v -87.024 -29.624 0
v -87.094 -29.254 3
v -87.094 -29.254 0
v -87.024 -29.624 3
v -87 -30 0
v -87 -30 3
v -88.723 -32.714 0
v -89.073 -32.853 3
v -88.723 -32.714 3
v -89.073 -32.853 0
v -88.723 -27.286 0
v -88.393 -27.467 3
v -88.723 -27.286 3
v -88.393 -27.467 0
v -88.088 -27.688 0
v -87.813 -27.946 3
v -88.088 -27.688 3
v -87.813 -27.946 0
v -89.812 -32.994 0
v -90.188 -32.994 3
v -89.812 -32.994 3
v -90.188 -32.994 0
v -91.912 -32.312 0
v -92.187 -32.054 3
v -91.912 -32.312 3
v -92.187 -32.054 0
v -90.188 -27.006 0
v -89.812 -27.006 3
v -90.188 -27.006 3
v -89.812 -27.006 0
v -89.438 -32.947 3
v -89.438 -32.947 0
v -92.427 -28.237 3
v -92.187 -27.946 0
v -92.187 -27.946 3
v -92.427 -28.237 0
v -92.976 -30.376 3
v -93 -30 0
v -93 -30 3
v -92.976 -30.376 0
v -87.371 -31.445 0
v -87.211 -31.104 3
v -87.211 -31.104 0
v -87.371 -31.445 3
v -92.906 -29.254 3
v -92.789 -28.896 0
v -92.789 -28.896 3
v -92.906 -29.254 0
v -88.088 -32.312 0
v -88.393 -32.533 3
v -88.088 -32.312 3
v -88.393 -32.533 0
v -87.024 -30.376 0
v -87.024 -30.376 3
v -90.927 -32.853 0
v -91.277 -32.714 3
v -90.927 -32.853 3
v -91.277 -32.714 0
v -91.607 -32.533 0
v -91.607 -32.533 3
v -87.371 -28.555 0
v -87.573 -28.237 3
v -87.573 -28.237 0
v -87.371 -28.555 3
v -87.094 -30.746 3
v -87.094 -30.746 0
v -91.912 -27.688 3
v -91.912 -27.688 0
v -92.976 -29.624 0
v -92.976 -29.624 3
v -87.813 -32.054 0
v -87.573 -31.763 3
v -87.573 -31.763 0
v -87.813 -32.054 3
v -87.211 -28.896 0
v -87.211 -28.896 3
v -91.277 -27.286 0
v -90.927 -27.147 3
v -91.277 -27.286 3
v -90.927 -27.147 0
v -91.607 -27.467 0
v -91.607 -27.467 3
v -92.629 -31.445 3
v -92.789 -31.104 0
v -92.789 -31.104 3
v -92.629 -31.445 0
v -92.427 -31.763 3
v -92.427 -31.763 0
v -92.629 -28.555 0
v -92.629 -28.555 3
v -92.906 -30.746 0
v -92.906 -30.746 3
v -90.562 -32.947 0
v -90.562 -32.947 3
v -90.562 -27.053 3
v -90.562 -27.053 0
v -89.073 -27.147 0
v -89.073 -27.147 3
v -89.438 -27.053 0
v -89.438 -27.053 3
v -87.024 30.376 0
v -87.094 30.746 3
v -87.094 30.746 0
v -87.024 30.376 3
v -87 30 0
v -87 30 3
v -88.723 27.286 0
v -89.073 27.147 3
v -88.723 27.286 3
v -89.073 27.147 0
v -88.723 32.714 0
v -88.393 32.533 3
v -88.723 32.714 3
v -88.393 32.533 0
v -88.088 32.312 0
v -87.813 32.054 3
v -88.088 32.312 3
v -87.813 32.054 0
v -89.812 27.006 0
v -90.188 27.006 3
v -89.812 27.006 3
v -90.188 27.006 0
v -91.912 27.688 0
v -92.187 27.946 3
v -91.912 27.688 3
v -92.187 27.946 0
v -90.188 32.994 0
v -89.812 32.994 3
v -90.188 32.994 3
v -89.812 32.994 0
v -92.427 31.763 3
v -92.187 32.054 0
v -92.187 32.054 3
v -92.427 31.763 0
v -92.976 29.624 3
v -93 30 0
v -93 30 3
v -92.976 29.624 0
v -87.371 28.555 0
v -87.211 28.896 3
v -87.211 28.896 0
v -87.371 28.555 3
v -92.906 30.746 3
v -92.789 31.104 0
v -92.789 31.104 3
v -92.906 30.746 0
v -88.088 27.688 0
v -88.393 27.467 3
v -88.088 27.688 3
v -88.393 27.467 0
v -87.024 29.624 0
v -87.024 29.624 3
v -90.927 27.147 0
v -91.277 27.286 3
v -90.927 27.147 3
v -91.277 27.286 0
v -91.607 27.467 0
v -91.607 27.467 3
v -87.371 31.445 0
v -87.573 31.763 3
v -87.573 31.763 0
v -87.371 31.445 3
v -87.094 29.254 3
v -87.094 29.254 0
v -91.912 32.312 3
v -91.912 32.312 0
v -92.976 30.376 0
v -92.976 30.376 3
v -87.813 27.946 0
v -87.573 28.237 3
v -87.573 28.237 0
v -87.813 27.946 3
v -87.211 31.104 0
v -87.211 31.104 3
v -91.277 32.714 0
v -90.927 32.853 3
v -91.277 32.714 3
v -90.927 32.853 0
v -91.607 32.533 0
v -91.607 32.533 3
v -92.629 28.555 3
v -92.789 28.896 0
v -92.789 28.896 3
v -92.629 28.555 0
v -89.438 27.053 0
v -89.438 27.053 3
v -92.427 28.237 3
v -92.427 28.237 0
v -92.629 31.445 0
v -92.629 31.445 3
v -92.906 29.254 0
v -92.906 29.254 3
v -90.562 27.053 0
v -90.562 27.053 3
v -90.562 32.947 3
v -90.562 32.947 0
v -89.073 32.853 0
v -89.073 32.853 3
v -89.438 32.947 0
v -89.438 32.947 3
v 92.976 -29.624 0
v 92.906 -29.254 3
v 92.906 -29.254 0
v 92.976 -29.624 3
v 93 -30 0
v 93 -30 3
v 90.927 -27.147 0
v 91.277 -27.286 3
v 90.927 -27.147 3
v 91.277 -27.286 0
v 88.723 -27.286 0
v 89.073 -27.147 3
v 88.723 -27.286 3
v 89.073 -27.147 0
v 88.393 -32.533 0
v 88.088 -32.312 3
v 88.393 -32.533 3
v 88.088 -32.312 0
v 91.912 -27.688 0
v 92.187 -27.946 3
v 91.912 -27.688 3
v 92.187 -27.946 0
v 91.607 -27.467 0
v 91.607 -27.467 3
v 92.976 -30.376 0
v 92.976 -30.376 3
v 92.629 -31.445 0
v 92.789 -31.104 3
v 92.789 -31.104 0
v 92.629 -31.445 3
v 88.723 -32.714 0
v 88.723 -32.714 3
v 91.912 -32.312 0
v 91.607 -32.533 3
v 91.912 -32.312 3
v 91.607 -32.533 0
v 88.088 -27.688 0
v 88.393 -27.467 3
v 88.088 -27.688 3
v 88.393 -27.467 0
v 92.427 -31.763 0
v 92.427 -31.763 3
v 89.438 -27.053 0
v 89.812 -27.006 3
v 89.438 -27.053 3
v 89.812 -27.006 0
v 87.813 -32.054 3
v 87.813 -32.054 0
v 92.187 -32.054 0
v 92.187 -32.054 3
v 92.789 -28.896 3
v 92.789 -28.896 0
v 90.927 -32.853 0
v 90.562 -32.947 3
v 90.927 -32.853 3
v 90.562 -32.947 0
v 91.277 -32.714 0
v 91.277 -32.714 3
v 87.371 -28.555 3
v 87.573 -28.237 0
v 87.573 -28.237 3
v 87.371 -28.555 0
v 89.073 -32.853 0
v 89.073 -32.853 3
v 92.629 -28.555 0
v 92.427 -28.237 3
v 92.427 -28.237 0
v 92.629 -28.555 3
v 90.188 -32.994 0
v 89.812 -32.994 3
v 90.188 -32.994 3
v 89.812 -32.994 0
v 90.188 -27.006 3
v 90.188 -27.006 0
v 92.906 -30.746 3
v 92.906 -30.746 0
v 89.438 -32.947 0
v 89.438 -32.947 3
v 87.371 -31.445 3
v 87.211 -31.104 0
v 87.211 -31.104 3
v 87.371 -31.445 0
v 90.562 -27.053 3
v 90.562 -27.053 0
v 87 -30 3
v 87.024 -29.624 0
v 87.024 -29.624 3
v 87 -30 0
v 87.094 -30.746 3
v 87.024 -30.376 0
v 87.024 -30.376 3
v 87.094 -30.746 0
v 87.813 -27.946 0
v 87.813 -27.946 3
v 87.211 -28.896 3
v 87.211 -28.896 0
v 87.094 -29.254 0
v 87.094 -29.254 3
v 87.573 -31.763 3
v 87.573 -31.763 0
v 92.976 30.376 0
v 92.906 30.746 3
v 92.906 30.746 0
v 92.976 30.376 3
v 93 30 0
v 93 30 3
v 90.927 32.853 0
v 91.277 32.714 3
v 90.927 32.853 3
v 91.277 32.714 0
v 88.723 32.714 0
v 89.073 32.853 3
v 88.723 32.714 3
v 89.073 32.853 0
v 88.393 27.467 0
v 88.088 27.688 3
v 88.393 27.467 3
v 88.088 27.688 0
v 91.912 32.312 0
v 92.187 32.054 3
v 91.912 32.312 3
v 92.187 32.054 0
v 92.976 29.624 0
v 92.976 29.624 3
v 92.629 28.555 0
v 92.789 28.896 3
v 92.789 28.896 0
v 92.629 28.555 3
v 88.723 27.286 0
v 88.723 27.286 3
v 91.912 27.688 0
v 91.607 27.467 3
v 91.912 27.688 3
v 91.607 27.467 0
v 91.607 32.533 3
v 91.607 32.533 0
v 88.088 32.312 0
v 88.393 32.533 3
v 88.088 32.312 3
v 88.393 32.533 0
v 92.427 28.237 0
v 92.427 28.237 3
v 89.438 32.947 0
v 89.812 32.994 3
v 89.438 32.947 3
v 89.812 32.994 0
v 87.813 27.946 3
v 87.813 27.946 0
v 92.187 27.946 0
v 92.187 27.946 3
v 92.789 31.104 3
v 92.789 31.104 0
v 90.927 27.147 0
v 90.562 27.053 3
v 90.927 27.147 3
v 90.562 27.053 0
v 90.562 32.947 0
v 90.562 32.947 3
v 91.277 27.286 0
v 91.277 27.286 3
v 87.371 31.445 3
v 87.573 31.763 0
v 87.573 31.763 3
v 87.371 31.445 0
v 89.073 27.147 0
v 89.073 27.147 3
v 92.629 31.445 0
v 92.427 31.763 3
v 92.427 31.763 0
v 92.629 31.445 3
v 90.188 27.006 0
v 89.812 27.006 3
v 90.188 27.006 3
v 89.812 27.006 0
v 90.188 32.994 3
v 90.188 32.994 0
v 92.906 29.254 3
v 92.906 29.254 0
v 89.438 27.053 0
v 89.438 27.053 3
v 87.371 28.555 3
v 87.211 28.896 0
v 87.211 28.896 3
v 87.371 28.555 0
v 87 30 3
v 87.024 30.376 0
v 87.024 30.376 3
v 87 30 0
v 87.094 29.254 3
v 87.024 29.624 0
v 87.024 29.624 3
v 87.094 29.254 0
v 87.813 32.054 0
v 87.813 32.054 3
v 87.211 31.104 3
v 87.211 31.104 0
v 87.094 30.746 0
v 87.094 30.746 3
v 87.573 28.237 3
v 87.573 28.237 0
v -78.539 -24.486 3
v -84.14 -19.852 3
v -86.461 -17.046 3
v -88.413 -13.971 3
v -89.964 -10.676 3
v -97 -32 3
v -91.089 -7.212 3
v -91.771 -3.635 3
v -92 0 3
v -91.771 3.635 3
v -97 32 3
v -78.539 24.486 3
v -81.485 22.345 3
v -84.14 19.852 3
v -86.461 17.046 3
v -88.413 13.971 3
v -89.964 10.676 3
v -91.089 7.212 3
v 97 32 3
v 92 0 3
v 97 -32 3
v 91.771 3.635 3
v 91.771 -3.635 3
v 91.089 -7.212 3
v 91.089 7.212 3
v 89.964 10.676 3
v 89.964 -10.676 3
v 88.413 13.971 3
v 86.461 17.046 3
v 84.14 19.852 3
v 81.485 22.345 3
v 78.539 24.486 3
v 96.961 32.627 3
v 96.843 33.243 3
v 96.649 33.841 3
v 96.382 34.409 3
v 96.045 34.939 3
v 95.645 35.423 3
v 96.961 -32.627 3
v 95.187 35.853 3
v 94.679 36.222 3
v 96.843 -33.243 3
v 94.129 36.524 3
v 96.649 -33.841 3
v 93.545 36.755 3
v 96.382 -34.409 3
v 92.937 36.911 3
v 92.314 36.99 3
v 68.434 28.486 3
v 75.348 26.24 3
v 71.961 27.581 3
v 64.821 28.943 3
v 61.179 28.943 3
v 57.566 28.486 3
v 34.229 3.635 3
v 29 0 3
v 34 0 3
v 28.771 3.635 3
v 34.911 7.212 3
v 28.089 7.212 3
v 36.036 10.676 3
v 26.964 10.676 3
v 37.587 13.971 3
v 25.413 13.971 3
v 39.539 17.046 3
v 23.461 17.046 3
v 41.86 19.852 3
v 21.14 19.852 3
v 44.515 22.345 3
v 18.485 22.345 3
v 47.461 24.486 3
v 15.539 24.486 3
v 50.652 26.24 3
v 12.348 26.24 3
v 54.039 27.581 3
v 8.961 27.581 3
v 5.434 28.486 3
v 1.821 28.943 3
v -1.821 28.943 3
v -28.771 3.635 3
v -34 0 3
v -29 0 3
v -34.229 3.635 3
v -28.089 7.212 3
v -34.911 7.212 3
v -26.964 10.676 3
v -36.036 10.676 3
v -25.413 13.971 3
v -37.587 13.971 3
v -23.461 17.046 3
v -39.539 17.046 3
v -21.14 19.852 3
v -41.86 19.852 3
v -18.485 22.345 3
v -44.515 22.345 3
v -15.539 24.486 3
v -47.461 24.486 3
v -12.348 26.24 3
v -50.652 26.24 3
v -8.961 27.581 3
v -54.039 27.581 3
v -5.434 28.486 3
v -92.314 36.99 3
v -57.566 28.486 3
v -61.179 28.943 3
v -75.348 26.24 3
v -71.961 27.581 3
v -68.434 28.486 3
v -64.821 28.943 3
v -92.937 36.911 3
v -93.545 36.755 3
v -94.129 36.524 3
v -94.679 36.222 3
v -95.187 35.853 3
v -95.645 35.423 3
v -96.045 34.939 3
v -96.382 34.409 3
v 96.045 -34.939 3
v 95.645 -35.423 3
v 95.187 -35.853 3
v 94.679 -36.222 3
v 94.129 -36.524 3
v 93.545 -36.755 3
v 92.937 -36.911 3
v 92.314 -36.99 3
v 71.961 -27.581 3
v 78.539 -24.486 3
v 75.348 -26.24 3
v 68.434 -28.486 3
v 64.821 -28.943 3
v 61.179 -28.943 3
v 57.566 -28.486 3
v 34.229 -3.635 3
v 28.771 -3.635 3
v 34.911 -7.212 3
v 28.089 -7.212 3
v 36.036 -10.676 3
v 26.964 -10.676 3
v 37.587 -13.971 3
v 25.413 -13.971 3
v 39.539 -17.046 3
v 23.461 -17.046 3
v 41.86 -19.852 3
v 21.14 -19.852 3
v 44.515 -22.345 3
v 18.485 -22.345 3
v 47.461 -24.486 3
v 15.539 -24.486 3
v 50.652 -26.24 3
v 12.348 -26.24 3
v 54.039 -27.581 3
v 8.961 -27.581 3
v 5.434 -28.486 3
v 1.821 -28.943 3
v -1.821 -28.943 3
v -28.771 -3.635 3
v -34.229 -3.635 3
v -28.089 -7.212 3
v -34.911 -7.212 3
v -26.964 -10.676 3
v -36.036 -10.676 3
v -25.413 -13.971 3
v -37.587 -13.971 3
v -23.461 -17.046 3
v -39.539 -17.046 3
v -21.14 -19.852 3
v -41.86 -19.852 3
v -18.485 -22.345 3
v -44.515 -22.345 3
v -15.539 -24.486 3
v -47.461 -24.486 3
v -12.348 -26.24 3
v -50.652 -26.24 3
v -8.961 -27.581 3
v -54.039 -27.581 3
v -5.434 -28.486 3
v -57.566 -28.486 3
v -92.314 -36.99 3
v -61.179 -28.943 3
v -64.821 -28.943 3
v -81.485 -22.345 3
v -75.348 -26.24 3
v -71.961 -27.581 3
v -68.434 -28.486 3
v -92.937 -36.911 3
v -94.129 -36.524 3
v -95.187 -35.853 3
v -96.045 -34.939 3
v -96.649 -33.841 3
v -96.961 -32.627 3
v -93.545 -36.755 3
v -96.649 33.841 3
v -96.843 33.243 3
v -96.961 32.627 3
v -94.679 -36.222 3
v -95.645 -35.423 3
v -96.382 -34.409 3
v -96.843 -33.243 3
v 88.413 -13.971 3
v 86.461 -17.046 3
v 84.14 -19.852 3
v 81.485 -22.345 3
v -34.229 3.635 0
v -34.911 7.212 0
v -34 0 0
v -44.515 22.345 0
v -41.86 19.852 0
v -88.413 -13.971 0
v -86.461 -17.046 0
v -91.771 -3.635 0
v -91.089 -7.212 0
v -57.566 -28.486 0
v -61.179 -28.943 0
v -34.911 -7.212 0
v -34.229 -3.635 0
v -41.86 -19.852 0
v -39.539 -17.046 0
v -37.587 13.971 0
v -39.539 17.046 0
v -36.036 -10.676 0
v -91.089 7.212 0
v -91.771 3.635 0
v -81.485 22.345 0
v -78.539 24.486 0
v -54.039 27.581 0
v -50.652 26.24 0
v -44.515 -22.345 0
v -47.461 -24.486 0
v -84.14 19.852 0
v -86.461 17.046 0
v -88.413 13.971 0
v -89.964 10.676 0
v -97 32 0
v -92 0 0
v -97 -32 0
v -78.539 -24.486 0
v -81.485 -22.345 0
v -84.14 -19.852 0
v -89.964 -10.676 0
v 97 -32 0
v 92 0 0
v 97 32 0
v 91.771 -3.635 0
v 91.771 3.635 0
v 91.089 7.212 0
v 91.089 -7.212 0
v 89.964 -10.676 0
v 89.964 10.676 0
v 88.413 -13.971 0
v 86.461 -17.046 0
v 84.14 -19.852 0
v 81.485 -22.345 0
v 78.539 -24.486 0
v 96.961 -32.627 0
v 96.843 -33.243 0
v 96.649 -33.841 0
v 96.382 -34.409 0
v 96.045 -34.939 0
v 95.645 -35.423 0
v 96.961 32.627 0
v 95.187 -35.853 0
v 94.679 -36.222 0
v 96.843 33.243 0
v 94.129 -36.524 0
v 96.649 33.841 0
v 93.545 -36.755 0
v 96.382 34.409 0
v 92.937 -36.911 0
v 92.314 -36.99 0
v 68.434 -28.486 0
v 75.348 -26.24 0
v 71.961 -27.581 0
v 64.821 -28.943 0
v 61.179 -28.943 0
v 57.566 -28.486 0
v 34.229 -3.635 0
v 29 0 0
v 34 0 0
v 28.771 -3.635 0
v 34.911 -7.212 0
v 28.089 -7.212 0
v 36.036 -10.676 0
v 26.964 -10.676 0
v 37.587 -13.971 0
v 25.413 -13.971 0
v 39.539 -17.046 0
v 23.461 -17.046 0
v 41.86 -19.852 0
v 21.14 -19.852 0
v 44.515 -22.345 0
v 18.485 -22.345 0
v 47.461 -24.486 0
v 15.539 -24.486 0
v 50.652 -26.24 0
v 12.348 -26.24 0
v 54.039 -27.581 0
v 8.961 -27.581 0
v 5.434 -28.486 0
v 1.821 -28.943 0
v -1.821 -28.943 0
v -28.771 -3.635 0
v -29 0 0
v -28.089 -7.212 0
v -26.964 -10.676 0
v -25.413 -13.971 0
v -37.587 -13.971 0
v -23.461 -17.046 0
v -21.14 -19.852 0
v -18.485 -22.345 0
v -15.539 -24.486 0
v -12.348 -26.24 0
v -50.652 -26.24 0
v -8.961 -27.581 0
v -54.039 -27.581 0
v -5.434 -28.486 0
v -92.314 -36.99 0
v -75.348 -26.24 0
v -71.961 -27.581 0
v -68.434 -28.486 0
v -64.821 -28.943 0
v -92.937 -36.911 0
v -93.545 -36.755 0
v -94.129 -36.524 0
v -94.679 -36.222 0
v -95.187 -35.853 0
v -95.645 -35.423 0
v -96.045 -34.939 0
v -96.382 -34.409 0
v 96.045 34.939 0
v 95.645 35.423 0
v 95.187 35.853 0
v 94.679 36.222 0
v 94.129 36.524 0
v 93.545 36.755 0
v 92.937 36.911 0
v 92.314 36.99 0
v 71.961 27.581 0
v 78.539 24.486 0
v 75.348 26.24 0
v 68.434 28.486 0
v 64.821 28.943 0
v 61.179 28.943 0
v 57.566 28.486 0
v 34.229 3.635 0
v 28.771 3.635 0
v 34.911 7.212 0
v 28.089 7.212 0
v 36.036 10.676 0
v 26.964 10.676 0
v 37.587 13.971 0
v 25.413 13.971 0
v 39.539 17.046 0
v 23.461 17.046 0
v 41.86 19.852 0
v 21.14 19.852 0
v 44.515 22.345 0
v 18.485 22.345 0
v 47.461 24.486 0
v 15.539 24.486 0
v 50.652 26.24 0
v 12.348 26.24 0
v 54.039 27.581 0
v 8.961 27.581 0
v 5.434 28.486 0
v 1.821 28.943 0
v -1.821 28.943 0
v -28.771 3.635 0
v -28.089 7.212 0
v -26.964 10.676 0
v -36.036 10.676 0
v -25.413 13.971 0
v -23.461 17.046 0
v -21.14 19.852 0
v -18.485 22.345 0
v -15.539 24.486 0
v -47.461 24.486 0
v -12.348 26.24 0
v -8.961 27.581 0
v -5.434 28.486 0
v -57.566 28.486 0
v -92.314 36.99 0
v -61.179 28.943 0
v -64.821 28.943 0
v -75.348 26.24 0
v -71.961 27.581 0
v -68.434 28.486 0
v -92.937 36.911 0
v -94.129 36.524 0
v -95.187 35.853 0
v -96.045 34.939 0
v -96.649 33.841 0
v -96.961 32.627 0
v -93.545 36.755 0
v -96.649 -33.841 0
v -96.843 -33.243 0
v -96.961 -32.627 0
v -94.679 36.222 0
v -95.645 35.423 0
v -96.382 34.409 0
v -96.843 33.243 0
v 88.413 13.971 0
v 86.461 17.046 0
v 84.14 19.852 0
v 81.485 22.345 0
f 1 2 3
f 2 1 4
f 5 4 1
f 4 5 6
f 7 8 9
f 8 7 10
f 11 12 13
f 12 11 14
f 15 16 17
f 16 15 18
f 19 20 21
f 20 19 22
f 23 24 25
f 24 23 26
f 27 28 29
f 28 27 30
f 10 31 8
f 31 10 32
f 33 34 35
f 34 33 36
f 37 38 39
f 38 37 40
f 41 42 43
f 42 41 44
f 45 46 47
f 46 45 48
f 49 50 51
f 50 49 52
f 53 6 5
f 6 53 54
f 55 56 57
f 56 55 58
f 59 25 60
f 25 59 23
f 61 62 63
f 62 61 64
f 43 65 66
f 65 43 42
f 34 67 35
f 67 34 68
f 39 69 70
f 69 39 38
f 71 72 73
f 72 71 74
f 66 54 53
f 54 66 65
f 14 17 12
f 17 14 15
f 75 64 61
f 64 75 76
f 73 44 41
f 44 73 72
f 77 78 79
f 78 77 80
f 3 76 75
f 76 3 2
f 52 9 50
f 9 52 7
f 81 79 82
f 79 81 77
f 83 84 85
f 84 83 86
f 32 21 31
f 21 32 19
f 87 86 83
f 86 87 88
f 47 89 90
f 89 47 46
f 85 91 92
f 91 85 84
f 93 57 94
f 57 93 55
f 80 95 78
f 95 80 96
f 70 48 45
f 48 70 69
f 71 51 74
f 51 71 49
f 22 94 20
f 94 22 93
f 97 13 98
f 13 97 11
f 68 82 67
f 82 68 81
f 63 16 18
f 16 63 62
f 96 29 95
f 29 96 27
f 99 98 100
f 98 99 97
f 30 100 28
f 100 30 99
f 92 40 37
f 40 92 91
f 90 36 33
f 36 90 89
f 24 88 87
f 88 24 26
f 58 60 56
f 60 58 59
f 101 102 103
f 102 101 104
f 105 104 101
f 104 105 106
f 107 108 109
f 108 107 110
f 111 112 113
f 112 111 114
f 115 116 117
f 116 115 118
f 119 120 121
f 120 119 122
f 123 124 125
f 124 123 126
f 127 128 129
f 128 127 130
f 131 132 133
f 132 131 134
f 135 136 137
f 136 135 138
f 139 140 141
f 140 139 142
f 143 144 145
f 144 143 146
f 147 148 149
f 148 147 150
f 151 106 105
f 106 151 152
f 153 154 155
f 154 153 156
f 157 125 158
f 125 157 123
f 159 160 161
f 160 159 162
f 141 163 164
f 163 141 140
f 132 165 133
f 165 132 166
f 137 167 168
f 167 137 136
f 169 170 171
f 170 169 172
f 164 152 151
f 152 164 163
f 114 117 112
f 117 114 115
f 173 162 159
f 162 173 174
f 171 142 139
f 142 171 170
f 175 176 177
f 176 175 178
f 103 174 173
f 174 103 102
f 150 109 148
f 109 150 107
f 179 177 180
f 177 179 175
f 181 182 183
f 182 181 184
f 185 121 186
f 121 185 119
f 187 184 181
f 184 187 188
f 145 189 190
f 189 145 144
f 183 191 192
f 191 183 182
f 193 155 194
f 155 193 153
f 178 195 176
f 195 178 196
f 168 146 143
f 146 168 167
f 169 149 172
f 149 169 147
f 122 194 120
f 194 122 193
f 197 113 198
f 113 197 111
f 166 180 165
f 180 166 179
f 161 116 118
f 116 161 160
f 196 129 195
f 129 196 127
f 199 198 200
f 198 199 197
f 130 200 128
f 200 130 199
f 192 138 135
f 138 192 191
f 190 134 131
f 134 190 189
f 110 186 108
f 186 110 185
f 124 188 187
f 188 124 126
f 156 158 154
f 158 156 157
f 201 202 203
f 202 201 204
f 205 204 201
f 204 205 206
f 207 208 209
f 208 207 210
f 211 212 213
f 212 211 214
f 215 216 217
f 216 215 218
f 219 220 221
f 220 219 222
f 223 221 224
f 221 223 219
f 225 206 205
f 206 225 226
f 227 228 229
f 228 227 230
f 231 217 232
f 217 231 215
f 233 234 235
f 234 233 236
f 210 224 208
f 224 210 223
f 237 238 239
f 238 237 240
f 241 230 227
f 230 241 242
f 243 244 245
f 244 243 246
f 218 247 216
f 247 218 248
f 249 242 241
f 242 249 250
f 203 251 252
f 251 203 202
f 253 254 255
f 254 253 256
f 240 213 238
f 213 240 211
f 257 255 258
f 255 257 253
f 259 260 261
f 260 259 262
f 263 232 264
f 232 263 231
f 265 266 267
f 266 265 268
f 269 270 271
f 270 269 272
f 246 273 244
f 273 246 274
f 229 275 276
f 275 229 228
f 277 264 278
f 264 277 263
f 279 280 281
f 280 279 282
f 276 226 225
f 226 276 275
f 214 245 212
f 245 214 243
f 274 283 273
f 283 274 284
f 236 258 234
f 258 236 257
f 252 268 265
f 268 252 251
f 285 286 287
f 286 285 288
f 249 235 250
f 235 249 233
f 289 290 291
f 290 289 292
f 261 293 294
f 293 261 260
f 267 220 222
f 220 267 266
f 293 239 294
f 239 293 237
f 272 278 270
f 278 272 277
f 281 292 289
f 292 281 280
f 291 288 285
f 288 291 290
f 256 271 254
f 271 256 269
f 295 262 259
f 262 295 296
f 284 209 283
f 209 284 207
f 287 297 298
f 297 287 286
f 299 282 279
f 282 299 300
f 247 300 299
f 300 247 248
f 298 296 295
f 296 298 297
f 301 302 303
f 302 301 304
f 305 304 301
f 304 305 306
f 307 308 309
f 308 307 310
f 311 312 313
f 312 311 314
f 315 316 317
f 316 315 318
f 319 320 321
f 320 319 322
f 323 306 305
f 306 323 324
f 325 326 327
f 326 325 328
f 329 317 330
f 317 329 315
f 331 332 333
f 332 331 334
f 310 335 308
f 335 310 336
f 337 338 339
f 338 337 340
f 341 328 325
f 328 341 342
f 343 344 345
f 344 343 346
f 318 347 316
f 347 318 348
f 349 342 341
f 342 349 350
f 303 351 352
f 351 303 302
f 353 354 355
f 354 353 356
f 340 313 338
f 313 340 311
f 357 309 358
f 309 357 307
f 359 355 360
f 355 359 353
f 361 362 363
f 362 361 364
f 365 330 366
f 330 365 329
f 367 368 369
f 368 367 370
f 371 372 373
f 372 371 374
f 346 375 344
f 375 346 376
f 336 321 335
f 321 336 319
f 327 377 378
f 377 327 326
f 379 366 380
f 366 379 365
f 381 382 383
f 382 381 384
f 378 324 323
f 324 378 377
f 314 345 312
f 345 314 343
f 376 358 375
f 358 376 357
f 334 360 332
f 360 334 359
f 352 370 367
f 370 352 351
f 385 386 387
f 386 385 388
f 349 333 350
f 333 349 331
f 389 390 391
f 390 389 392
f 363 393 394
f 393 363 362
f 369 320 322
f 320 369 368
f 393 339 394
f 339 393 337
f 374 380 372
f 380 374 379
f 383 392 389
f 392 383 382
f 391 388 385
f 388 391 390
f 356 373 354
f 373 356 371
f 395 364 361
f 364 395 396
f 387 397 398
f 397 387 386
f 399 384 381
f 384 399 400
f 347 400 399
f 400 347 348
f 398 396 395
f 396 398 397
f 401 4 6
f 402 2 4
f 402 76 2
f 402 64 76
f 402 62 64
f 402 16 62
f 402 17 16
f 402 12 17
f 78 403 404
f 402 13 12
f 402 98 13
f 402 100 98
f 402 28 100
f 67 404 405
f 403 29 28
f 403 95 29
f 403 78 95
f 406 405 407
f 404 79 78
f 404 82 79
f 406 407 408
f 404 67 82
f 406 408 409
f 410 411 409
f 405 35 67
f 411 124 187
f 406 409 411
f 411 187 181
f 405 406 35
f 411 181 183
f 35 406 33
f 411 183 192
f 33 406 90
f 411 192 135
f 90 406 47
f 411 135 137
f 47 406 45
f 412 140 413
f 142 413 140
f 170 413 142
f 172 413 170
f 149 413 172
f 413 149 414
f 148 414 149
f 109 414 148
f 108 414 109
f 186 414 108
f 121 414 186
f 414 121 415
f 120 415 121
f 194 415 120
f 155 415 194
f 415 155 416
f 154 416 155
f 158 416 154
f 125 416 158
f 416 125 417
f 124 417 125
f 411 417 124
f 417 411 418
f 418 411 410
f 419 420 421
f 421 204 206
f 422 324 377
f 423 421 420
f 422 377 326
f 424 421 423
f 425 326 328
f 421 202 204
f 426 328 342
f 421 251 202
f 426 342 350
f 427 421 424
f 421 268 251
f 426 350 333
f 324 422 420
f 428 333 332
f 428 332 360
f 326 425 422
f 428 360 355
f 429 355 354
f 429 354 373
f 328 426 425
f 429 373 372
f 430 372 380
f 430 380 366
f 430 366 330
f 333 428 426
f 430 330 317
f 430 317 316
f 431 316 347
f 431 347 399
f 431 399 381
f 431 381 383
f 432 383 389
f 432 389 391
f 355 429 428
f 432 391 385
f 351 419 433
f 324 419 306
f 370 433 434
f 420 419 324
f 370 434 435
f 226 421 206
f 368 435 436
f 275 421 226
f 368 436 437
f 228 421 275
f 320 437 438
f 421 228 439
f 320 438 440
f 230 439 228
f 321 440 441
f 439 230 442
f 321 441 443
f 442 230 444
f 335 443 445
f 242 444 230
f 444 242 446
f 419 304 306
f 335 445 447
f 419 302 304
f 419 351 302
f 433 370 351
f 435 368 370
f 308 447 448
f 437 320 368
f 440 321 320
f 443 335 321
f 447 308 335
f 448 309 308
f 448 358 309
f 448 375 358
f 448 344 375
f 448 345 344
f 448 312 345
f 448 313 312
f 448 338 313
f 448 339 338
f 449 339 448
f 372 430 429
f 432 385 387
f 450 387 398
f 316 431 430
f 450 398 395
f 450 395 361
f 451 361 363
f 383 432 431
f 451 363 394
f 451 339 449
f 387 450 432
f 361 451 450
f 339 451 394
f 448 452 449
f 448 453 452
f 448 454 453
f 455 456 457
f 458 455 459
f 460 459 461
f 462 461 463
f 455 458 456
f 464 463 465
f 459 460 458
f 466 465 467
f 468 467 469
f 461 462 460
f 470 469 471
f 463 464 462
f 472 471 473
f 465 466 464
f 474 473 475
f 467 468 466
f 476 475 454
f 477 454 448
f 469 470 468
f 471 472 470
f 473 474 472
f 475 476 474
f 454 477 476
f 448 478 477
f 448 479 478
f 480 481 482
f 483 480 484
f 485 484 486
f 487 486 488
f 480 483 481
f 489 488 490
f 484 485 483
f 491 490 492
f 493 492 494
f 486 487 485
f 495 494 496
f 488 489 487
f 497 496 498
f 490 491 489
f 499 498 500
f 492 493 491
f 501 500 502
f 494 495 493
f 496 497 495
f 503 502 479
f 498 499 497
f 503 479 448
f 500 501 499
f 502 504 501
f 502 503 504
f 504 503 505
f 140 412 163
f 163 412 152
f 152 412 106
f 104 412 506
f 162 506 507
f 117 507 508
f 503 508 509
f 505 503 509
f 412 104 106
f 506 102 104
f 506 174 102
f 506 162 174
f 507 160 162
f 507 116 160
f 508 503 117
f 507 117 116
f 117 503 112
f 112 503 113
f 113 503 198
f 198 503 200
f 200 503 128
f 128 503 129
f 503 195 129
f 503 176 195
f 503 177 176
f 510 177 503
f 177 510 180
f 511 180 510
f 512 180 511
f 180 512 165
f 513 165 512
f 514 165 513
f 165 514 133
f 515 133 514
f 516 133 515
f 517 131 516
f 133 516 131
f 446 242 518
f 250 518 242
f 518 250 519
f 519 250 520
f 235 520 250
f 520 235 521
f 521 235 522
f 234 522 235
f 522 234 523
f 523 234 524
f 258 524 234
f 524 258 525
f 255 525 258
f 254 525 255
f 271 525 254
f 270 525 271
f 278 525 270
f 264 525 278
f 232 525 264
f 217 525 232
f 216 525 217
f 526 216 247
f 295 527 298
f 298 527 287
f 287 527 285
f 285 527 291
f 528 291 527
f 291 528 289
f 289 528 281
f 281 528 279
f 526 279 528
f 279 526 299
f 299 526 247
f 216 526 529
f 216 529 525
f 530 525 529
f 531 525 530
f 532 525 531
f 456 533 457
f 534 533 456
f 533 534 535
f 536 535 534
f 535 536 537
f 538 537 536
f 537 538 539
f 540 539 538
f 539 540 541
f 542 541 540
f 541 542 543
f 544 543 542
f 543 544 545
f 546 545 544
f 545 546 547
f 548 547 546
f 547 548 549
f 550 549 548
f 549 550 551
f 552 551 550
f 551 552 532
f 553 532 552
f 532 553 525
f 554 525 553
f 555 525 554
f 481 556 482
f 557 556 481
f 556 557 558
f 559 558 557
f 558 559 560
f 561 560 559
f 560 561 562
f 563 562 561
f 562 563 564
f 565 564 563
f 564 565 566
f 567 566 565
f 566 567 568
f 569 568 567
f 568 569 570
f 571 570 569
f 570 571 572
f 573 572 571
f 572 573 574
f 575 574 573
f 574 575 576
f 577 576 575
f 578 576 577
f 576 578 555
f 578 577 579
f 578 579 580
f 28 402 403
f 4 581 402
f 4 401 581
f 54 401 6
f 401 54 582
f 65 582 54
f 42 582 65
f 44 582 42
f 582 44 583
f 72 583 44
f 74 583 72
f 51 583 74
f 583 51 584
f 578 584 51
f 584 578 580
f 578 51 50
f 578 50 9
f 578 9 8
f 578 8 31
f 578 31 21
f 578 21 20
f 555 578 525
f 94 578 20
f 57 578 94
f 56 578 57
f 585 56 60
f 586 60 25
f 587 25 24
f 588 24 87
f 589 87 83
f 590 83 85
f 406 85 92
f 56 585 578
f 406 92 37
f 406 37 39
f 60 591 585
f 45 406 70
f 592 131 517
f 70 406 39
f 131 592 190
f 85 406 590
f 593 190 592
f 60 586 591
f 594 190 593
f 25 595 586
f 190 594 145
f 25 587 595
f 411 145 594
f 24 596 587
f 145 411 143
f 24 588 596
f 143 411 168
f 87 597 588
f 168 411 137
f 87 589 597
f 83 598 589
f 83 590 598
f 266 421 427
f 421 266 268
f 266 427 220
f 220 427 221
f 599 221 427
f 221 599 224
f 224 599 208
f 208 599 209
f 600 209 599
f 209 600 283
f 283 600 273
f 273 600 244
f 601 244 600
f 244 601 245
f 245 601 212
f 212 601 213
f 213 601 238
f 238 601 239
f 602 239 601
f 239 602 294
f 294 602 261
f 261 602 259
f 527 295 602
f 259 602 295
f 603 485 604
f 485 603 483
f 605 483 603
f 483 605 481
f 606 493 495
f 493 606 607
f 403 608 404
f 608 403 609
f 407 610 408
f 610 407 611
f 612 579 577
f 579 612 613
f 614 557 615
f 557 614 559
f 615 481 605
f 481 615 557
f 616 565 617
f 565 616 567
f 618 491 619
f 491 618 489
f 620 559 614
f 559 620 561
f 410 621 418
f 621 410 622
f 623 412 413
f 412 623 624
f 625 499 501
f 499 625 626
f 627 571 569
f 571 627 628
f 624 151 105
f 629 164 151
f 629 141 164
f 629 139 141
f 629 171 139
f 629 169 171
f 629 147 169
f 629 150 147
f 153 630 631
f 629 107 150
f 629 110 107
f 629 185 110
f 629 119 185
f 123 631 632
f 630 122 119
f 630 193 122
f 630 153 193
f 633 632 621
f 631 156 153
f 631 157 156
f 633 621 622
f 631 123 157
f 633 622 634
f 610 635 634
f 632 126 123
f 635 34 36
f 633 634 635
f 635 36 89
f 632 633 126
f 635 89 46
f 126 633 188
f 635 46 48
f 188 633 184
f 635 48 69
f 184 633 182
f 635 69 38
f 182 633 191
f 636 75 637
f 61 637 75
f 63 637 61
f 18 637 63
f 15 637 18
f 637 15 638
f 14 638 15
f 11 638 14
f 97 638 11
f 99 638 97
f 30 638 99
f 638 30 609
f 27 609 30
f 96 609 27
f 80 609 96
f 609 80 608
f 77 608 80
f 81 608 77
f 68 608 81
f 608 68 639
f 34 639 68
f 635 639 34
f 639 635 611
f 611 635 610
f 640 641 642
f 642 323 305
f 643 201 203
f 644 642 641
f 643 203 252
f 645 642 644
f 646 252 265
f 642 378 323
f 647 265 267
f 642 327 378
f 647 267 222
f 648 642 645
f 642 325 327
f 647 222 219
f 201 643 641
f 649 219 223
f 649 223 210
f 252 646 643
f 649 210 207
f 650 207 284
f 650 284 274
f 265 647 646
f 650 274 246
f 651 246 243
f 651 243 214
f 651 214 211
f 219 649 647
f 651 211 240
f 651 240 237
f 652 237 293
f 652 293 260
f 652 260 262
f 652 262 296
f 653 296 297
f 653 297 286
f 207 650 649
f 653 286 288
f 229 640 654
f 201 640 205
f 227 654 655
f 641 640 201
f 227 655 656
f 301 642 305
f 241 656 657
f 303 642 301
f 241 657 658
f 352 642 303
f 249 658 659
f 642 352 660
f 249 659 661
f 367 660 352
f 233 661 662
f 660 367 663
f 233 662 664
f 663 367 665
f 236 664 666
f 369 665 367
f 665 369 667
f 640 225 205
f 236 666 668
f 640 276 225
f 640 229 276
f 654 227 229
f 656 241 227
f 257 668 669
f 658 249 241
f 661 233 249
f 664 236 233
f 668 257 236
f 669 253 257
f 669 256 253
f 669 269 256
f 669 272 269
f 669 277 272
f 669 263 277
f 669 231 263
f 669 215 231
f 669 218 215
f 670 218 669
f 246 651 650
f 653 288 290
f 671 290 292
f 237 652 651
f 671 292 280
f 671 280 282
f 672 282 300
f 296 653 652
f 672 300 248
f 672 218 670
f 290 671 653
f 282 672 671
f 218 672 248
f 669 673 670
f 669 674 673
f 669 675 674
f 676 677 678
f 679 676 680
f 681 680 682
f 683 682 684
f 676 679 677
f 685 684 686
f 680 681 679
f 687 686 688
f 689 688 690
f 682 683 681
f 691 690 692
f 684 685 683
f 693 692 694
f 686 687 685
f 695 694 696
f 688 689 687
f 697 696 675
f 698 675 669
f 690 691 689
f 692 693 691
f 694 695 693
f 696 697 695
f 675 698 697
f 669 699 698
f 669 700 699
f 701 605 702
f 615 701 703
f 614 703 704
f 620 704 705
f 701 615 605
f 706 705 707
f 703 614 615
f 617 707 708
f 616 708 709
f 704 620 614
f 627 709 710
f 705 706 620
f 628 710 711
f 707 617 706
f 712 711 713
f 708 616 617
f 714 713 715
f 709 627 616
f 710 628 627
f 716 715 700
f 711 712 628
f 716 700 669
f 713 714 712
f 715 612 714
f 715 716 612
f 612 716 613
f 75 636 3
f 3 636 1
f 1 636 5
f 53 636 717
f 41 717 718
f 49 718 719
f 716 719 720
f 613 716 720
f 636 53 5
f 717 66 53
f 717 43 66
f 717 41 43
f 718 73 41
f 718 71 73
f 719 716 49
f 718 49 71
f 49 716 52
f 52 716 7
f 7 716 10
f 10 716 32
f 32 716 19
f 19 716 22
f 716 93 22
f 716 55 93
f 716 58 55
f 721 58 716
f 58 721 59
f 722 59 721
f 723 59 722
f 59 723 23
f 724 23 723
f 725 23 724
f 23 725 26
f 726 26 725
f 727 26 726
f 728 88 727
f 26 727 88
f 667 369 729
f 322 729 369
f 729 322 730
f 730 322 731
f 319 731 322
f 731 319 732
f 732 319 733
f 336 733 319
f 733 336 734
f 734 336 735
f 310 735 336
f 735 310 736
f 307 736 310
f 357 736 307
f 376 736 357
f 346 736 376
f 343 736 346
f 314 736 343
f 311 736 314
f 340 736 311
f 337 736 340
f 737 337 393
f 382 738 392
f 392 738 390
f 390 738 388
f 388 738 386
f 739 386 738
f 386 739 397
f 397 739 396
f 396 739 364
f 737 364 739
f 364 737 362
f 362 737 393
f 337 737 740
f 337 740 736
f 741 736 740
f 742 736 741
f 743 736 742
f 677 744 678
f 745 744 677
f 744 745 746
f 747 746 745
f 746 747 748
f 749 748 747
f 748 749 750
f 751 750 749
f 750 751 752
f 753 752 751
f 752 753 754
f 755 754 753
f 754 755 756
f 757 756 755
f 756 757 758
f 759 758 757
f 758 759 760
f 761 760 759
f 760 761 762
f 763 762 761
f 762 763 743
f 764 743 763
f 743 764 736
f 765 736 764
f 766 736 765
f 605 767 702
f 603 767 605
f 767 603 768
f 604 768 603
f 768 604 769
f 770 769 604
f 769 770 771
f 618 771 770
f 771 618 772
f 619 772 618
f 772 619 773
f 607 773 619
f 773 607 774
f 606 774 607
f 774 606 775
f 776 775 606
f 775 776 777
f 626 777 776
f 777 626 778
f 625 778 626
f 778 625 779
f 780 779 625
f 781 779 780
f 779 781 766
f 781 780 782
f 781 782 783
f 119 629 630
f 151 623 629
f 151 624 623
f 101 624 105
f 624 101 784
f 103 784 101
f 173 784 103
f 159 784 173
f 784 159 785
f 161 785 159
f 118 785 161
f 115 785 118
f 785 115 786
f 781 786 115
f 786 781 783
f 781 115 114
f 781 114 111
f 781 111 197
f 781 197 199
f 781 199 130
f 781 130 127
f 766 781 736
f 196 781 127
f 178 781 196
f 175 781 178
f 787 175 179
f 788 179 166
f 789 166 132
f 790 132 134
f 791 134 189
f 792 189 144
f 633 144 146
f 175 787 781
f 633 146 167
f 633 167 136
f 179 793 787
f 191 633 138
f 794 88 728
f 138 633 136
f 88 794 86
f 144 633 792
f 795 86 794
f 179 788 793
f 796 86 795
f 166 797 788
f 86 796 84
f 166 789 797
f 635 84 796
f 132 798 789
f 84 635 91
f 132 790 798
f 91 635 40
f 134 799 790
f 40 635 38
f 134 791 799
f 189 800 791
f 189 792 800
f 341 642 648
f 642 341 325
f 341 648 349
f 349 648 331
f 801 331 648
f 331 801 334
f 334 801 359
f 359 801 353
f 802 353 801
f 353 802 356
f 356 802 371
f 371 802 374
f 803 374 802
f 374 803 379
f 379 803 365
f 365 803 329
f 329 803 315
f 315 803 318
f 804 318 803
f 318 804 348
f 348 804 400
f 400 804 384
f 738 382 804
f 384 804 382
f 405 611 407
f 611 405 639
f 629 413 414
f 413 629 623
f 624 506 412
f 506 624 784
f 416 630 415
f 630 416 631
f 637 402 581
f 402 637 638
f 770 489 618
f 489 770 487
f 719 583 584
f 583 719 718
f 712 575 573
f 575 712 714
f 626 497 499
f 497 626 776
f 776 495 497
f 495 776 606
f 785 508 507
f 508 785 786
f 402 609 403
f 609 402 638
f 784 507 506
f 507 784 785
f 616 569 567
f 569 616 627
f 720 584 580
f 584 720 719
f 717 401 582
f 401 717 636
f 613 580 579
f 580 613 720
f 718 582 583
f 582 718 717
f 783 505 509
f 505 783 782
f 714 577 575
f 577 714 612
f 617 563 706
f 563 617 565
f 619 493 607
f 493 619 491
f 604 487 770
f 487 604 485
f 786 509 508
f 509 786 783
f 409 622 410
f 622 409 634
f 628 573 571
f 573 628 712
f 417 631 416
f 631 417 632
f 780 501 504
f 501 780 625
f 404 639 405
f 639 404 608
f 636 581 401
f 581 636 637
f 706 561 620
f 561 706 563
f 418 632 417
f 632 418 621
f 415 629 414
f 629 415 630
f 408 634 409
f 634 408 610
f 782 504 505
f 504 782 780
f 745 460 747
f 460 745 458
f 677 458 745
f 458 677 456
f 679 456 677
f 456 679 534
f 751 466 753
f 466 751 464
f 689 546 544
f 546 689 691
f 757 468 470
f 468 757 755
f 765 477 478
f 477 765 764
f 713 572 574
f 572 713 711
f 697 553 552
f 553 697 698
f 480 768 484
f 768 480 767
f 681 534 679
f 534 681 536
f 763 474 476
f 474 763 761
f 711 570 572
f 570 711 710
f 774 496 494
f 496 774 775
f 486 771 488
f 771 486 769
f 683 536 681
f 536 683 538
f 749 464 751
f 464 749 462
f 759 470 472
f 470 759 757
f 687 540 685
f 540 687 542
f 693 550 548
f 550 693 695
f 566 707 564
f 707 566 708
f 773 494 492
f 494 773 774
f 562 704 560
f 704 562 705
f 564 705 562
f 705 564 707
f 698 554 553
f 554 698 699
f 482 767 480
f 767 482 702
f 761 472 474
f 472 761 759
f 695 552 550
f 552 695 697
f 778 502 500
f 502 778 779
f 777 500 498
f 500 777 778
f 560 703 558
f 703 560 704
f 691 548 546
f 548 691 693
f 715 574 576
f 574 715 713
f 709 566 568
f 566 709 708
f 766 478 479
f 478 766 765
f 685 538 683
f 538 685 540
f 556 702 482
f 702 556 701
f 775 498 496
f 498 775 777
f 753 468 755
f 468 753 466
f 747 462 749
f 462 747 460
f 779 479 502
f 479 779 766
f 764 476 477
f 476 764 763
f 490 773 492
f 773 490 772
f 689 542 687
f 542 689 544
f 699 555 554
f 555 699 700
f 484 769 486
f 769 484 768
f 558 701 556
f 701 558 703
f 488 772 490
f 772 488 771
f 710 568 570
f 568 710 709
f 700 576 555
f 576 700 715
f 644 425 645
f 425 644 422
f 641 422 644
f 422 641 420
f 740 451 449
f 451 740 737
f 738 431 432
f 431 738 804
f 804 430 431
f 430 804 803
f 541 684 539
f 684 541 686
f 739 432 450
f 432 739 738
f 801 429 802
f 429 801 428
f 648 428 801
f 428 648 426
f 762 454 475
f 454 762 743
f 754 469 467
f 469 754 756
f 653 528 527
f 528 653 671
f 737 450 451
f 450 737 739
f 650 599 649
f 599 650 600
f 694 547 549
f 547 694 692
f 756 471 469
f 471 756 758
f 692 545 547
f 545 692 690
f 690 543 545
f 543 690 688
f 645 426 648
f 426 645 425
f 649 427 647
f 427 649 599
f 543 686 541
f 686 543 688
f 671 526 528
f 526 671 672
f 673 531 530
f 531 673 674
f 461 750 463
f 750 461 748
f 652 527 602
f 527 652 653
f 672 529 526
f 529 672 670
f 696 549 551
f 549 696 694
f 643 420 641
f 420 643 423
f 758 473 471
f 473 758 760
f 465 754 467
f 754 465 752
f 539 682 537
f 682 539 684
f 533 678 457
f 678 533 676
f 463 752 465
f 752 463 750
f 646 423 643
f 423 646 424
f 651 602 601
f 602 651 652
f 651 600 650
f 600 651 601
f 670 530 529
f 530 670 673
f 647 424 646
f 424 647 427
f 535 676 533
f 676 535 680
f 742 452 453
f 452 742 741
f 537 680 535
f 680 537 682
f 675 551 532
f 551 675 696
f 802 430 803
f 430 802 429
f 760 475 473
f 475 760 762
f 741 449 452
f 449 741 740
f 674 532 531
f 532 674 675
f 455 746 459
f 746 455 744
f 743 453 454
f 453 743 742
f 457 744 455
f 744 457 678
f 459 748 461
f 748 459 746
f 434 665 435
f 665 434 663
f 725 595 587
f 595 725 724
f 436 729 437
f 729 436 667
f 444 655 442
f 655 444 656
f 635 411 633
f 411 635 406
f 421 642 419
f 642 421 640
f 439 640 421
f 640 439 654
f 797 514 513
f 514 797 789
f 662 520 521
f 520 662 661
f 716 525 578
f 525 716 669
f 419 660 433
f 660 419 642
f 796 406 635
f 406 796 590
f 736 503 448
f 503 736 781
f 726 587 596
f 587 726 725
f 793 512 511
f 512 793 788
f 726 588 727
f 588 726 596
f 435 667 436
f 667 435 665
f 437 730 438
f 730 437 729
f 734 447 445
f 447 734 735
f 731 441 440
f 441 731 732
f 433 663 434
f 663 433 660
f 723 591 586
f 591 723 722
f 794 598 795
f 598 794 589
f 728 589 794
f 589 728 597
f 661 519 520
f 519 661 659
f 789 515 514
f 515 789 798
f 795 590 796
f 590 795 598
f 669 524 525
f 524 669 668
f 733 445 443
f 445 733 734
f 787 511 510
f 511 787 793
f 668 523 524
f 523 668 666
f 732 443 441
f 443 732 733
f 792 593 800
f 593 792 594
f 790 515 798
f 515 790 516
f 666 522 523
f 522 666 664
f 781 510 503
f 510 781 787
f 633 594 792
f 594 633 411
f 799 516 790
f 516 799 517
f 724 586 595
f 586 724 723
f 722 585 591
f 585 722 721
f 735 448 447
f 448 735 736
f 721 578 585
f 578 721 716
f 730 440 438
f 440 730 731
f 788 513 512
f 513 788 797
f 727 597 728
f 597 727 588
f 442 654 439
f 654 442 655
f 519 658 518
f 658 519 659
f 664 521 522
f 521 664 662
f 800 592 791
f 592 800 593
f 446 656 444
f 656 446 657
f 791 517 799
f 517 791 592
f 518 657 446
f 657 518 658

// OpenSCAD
$fn = 50;


difference() {
	union() {
		hull() {
			translate(v = [-92.0000000000, 32.0000000000, 0]) {
				cylinder(h = 3, r = 5);
			}
			translate(v = [92.0000000000, 32.0000000000, 0]) {
				cylinder(h = 3, r = 5);
			}
			translate(v = [-92.0000000000, -32.0000000000, 0]) {
				cylinder(h = 3, r = 5);
			}
			translate(v = [92.0000000000, -32.0000000000, 0]) {
				cylinder(h = 3, r = 5);
			}
		}
	}
	union() {
		#translate(v = [-90.0000000000, -30.0000000000, -100.0000000000]) {
			cylinder(h = 200, r = 3.0000000000);
		}
		#translate(v = [-90.0000000000, 30.0000000000, -100.0000000000]) {
			cylinder(h = 200, r = 3.0000000000);
		}
		#translate(v = [90.0000000000, -30.0000000000, -100.0000000000]) {
			cylinder(h = 200, r = 3.0000000000);
		}
		#translate(v = [90.0000000000, 30.0000000000, -100.0000000000]) {
			cylinder(h = 200, r = 3.0000000000);
		}
		#translate(v = [-63.0000000000, 0, 0]) {
			cylinder(h = 3, r = 29.0000000000);
		}
		#cylinder(h = 3, r = 29.0000000000);
		#translate(v = [63.0000000000, 0, 0]) {
			cylinder(h = 3, r = 29.0000000000);
		}
	}
}
